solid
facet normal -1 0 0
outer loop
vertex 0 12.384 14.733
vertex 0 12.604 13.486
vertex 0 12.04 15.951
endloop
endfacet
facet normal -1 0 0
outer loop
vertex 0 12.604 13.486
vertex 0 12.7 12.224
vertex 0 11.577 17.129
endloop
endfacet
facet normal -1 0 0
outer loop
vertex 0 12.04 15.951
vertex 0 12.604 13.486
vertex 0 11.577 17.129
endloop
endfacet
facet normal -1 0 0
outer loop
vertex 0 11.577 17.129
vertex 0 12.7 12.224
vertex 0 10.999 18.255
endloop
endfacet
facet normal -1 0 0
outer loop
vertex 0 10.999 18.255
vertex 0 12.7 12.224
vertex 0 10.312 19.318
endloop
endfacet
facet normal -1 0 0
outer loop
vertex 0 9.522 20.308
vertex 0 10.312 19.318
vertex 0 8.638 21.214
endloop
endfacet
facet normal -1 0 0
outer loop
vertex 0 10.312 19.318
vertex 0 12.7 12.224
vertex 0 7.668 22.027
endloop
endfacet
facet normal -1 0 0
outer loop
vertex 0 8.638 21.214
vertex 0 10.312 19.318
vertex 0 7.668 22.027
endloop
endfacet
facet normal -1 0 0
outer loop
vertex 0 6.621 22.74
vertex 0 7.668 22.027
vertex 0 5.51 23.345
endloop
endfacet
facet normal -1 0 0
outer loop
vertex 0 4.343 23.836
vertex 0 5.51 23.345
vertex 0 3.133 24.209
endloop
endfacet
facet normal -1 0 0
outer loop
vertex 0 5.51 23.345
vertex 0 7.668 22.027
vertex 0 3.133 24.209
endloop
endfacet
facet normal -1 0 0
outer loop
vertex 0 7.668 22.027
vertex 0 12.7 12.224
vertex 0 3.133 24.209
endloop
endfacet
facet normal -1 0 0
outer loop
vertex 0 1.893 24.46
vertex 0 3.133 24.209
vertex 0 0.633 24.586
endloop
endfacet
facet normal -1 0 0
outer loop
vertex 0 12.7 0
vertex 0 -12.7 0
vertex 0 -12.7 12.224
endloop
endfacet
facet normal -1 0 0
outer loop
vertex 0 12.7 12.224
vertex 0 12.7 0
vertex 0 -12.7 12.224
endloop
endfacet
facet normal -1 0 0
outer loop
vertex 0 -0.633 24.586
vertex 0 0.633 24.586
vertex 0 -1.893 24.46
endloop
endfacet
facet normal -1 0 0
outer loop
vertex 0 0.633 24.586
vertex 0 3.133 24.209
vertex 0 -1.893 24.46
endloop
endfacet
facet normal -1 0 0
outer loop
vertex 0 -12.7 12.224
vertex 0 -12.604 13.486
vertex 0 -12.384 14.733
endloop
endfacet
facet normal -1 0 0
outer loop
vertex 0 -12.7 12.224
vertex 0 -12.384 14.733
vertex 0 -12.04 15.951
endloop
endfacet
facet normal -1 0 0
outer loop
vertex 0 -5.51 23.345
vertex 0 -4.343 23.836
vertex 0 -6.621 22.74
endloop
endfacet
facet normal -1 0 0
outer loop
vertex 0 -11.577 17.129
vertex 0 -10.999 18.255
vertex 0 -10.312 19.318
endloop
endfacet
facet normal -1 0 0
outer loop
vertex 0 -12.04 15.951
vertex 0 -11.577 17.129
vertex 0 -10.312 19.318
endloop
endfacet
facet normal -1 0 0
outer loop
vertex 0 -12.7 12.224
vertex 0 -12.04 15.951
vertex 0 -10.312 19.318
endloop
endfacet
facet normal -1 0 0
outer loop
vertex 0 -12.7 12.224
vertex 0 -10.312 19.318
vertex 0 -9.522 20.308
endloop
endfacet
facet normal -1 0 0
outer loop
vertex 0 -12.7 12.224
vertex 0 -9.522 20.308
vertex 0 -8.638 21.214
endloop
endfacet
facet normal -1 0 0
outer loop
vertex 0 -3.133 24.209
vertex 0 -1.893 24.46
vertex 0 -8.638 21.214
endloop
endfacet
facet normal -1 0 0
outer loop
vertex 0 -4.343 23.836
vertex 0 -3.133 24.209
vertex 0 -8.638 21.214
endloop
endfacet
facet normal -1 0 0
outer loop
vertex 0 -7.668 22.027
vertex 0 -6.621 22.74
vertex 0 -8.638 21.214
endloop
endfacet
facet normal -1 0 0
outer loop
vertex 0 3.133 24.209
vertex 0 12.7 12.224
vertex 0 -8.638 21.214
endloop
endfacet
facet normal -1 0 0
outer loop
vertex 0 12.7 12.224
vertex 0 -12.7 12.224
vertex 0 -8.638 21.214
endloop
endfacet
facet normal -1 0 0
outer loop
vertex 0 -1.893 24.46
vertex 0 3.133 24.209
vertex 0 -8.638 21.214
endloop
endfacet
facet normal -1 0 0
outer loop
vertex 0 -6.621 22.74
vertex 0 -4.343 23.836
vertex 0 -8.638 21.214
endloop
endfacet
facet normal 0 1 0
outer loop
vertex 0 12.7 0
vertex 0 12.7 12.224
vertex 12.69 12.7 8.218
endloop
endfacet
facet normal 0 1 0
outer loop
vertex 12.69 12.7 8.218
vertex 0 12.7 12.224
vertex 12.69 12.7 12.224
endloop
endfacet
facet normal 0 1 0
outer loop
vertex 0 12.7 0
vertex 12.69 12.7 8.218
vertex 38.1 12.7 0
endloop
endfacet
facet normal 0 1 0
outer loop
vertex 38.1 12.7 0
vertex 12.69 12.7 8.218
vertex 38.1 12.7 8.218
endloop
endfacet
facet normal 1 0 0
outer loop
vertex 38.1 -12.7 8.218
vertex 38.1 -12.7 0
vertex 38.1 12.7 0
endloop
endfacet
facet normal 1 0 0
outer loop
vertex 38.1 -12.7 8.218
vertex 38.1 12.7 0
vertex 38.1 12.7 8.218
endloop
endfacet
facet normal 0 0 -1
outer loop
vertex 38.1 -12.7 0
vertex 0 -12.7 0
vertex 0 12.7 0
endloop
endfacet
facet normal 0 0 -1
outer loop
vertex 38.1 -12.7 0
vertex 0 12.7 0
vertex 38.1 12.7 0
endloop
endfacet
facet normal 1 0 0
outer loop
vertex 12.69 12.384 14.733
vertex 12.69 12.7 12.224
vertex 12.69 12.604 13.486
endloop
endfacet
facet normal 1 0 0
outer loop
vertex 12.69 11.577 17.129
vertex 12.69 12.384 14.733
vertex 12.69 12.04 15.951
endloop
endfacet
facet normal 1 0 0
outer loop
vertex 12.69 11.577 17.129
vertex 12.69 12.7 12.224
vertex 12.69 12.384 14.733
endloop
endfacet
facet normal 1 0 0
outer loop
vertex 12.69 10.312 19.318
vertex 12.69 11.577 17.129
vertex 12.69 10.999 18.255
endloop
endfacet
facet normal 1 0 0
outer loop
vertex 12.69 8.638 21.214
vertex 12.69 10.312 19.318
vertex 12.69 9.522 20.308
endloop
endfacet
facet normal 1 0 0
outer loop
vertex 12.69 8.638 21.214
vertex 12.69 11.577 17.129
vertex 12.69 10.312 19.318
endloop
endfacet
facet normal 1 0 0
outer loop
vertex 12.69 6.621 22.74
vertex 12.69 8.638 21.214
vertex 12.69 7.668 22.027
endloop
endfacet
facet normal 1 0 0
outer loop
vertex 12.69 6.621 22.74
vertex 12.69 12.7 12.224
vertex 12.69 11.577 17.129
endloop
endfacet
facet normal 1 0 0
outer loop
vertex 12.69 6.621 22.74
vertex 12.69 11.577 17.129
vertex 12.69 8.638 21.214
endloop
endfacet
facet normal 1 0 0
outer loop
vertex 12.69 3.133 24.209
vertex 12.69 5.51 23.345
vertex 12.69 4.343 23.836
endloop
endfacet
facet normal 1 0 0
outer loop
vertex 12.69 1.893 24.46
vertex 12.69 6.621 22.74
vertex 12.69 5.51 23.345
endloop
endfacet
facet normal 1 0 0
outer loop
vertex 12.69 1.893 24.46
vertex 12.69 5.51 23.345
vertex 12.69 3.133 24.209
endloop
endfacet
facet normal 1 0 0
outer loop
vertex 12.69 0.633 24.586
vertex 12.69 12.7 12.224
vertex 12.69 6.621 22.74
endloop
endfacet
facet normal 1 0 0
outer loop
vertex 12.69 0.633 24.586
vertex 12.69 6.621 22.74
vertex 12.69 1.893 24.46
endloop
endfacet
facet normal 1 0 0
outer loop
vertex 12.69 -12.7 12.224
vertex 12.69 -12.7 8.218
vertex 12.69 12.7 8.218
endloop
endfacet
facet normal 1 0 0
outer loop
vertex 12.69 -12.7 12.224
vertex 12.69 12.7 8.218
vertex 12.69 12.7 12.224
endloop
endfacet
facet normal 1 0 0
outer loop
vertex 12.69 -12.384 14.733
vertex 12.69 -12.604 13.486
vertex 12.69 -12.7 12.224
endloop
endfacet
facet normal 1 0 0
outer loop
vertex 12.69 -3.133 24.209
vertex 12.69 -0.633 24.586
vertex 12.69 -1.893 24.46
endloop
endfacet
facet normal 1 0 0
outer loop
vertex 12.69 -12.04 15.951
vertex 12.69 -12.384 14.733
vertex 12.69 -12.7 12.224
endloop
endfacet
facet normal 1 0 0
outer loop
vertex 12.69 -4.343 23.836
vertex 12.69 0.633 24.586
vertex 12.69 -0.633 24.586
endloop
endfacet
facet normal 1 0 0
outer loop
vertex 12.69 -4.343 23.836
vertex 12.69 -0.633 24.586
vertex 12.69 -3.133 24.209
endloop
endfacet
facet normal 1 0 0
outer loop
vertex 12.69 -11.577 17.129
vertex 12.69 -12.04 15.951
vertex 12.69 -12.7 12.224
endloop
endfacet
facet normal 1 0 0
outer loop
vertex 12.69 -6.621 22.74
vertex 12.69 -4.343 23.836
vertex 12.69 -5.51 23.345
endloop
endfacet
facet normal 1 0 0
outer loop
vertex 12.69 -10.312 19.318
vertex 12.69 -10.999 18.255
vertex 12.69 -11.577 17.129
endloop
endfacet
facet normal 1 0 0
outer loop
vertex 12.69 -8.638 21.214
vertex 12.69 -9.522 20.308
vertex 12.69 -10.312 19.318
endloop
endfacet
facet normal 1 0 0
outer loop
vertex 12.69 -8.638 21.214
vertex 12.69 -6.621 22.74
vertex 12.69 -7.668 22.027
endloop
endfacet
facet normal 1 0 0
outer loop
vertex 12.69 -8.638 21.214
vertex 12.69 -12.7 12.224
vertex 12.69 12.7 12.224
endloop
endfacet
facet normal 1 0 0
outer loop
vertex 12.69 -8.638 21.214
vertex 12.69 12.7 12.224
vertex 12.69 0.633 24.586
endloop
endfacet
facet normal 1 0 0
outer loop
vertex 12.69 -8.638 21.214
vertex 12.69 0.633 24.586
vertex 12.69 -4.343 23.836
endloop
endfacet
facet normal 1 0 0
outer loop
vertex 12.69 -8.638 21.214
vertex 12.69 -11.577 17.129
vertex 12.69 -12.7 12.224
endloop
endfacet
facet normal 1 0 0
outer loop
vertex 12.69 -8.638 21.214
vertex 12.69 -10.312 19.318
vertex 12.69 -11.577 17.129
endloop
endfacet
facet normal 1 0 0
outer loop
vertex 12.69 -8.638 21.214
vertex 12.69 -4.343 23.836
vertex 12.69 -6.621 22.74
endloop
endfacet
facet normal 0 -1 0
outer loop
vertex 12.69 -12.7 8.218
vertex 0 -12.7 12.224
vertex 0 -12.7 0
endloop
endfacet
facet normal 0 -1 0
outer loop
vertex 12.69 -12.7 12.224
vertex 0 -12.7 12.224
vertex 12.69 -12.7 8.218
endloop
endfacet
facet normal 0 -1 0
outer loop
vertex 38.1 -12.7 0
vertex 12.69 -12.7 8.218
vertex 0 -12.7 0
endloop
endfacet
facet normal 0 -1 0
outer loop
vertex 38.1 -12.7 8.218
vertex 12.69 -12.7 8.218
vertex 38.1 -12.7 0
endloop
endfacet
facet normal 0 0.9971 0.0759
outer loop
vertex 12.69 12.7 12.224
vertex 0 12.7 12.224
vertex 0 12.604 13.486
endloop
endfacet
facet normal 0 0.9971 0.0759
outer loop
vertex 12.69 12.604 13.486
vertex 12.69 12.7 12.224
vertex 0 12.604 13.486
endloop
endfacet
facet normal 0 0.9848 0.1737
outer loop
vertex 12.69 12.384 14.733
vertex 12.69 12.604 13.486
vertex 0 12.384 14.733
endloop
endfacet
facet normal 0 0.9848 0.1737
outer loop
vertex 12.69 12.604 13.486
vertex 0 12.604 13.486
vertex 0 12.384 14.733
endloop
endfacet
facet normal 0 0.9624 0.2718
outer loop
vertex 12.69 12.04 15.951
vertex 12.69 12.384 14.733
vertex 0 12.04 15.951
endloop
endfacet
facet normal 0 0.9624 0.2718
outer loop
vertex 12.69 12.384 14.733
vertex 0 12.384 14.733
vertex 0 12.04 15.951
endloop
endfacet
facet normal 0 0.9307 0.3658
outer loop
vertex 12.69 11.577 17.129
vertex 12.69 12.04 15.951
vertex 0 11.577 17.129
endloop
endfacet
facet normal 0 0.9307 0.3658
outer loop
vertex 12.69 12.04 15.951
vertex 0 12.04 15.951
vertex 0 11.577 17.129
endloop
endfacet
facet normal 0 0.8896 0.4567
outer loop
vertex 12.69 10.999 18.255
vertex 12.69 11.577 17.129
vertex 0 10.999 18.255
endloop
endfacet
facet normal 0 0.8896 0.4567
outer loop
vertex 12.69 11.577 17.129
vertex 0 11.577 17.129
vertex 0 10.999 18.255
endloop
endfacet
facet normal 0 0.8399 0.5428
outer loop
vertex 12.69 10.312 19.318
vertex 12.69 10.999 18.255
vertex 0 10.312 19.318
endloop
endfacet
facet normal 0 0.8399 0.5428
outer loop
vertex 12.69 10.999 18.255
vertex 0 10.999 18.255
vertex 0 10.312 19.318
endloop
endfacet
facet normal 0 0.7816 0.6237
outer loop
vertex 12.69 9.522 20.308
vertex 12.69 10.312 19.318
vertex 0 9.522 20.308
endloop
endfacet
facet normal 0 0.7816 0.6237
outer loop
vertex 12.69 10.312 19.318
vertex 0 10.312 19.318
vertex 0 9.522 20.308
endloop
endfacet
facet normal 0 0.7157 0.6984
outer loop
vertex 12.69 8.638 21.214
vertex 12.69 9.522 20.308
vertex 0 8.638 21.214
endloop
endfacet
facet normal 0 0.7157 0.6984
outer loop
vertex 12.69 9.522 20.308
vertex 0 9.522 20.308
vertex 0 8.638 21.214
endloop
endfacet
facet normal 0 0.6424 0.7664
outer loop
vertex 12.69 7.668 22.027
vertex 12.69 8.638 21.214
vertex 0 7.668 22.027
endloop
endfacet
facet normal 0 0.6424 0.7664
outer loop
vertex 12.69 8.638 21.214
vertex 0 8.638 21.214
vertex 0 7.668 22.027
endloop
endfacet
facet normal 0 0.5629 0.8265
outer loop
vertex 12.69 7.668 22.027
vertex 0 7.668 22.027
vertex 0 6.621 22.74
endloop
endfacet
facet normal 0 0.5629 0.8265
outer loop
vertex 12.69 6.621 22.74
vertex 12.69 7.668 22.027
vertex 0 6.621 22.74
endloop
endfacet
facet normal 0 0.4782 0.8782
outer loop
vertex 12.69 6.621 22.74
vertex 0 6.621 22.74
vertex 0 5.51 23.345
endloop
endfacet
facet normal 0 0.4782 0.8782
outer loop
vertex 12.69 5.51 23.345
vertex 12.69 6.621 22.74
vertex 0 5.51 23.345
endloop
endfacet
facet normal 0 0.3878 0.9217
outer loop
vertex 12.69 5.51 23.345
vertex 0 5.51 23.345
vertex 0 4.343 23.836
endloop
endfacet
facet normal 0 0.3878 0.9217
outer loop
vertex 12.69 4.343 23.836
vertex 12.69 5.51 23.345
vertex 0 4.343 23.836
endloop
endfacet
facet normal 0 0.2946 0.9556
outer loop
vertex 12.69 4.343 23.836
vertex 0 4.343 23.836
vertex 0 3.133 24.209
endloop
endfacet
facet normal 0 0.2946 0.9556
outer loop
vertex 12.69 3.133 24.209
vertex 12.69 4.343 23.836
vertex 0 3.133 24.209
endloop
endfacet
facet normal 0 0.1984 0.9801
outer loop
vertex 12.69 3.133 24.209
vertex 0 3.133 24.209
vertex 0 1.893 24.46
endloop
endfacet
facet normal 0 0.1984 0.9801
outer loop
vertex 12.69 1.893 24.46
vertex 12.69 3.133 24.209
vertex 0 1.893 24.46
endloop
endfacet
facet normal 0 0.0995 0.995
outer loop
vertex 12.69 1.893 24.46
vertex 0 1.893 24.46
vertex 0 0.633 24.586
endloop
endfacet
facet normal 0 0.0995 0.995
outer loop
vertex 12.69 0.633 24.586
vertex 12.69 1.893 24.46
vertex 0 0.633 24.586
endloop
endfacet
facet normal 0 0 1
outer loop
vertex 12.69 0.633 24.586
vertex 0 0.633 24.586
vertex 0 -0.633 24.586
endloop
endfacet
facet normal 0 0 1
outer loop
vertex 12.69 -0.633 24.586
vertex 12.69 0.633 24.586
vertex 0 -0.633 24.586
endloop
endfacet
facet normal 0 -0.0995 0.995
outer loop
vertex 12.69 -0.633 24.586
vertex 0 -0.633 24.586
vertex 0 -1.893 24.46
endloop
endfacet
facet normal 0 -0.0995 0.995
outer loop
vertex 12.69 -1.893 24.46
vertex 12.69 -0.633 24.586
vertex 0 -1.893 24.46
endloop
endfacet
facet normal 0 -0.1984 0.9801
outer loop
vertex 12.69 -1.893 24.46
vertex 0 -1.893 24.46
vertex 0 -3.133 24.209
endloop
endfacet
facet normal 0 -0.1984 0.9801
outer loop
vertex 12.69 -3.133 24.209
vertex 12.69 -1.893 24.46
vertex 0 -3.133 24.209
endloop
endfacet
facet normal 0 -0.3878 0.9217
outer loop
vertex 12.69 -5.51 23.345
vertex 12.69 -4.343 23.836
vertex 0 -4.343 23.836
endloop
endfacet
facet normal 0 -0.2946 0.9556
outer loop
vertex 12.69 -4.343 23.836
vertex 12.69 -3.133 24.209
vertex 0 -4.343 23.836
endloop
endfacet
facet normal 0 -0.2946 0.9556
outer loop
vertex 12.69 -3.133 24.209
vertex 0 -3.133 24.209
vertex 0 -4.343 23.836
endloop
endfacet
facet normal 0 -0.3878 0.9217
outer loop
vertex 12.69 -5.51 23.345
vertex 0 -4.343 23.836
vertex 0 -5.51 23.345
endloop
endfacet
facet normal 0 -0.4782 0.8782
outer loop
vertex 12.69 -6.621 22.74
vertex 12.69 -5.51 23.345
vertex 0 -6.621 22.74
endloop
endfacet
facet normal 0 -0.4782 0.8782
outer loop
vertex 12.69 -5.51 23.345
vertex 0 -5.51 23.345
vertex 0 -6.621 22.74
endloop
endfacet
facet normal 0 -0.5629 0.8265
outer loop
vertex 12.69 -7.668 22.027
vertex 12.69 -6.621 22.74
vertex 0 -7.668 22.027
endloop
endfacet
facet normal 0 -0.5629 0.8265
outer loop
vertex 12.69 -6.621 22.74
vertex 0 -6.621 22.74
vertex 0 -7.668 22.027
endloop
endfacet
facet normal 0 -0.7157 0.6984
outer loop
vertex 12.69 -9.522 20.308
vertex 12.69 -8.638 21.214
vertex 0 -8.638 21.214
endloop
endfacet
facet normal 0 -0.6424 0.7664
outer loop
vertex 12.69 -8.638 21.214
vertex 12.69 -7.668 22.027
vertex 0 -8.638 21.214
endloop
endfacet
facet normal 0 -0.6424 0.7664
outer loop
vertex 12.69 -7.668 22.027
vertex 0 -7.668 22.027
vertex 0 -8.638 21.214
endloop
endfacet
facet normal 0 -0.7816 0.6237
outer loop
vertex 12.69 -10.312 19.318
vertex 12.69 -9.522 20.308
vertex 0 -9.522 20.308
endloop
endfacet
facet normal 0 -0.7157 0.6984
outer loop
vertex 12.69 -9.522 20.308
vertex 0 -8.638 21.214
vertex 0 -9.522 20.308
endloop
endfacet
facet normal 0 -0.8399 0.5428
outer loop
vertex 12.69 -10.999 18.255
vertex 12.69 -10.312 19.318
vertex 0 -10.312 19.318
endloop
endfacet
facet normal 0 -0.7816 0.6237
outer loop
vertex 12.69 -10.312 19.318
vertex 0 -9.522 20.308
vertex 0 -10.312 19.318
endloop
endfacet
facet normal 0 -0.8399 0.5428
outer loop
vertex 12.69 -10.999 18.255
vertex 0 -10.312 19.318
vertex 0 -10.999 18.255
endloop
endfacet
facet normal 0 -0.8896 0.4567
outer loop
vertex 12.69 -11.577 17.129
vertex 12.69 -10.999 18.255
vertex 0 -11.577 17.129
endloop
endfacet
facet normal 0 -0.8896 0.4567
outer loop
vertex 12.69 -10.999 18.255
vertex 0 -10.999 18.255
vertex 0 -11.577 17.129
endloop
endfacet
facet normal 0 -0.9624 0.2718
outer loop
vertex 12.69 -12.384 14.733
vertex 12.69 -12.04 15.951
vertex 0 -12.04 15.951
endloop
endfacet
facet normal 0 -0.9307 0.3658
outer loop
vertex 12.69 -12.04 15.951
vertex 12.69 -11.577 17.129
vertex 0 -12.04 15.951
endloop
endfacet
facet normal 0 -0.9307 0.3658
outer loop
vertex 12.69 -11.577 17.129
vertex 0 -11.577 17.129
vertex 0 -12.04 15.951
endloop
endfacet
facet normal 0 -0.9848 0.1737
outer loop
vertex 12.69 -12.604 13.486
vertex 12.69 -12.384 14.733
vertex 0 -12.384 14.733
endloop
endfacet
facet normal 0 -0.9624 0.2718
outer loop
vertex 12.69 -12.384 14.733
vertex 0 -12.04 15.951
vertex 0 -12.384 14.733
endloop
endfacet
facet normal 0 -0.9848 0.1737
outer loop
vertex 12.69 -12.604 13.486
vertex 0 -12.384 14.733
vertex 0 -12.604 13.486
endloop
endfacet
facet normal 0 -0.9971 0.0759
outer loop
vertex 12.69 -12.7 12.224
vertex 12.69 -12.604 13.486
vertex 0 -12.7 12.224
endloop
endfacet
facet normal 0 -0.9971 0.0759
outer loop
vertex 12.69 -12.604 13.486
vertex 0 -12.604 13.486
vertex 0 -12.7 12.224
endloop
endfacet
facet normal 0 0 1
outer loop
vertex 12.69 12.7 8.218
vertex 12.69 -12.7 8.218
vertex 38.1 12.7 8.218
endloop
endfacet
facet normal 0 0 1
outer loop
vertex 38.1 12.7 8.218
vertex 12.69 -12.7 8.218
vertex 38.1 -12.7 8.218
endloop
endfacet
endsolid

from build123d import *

# Parameters (mm, degrees)
F0_W     = 38.1
F0_H     = 25.4
F1_DEPTH = 12.7
F2_W     = 25.409764
F2_H     = 17.182311
F3_DEPTH = 25.401
F5_DEPTH = 38.101


with BuildPart() as f1:
    # F0 (on Front) → F1 (new body, symmetric)
    with BuildSketch(Plane.XZ):
        with Locations((19.05, 12.7)):
            Rectangle(F0_W, F0_H)
    extrude(amount=F1_DEPTH, both=True)

    # F2 (on face) → F3 (cut, through all)
    with BuildSketch(Plane.XZ.offset(12.7)):
        with Locations((25.395118, 16.808844)):
            Rectangle(F2_W, F2_H)
    extrude(amount=-F3_DEPTH, mode=Mode.SUBTRACT)

    # F4 (on face) → F5 (cut, through all)
    with BuildSketch(Plane(origin=(0, 0, 0), x_dir=(0, -1, 0), z_dir=(-1, 0, 0))):
        with BuildLine():
            ThreePointArc((-12.7, 12.223971), (0, 24.601783), (12.7, 12.223971))
            Line((12.7, 12.223971), (12.7, 25.4))
            Line((12.7, 25.4), (-12.7, 25.4))
            Line((-12.7, 25.4), (-12.7, 12.223971))
        make_face()
    extrude(amount=-F5_DEPTH, mode=Mode.SUBTRACT)


solid = f1.part
